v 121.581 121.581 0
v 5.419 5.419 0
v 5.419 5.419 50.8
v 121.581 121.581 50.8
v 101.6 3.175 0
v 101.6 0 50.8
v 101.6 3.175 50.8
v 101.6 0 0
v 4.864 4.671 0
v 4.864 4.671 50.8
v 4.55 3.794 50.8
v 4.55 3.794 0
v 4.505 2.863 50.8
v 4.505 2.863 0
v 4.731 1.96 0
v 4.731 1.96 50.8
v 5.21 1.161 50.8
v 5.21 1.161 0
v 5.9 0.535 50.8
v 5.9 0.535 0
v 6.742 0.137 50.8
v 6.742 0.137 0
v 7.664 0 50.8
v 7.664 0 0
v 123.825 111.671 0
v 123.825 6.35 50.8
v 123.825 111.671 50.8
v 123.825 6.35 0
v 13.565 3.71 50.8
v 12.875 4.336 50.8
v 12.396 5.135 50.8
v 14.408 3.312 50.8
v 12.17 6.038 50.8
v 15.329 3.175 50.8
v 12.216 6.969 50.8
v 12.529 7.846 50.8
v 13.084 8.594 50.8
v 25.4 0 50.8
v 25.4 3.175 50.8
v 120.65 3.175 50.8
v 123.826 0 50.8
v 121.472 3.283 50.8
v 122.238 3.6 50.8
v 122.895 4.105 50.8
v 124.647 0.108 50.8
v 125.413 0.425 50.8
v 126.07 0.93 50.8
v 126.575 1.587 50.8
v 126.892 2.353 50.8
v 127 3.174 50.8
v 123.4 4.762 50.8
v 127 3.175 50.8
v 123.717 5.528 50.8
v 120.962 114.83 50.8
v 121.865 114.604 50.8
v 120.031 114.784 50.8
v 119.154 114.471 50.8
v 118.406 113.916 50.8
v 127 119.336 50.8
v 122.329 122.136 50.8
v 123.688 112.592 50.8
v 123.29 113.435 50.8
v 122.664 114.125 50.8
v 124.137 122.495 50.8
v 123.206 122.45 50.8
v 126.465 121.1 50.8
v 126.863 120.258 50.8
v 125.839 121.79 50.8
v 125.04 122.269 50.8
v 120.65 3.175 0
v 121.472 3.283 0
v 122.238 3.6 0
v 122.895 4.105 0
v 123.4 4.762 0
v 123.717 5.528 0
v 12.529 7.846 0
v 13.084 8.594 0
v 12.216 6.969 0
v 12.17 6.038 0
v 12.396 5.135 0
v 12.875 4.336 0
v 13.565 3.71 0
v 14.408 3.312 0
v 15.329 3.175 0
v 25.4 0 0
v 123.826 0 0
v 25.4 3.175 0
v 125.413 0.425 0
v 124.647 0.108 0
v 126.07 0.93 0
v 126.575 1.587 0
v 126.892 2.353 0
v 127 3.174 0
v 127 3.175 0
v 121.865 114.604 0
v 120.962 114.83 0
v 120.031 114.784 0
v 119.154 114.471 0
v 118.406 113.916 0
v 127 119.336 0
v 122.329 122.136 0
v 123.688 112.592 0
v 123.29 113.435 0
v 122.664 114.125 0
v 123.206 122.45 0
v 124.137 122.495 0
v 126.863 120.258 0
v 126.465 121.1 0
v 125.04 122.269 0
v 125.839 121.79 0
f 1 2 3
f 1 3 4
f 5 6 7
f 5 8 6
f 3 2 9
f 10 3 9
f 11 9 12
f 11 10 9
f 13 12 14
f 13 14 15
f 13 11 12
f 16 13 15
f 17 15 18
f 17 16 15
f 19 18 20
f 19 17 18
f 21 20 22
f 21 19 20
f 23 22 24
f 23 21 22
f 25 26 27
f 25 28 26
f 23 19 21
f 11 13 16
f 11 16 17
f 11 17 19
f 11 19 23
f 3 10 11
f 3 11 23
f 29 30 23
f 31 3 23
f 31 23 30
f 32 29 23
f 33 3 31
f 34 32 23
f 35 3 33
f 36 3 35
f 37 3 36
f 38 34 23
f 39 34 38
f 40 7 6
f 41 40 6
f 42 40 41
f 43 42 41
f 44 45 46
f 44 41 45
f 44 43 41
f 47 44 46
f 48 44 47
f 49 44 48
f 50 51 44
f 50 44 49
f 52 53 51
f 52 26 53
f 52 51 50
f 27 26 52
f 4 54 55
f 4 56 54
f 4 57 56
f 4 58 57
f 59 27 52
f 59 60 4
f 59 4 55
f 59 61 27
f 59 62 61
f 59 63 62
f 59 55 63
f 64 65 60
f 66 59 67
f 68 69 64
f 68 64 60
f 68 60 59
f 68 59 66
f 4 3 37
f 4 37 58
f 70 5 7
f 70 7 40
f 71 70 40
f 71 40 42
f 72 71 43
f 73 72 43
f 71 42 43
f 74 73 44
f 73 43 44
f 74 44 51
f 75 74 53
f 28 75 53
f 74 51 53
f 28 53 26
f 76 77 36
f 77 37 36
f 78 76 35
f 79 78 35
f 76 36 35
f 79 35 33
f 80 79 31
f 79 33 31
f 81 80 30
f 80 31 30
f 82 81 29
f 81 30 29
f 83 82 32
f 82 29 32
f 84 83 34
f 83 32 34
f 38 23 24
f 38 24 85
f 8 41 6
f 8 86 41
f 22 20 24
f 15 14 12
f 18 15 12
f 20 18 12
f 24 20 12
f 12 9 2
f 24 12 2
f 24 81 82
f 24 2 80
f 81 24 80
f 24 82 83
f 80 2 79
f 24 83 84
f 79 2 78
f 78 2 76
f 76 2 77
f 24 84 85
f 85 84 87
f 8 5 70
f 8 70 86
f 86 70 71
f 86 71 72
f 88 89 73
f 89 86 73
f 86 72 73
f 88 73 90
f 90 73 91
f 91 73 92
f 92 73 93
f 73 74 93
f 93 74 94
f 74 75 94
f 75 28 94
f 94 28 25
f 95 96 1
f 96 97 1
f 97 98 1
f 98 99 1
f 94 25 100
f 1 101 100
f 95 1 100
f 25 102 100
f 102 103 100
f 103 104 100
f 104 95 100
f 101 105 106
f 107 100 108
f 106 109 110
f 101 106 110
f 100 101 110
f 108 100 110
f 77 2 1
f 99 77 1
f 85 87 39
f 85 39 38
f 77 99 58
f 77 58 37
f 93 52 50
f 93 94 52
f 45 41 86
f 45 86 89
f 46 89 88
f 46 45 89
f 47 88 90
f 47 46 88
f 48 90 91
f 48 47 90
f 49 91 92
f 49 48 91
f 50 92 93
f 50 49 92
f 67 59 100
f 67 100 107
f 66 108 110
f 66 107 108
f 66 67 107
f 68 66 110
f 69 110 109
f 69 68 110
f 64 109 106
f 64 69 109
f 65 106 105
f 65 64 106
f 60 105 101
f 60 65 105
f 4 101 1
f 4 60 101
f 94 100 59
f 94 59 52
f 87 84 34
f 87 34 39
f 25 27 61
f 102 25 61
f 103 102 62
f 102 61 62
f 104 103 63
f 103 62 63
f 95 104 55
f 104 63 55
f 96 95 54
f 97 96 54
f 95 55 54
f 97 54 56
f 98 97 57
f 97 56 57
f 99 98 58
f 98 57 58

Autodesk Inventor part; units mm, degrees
ref_plane "YZ Plane" through (0, 0, 0) normal (1, 0, 0) x (0, 1, 0)
ref_plane "XZ Plane" through (0, 0, 0) normal (0, 1, 0) x (-1, 0, 0)
ref_plane "XY Plane" through (0, 0, 0) normal (0, 0, 1) x (1, 0, 0)
sketch "Sketch1" plane through (0, 0, 0) normal (0, 0, 1) x (1, 0, 0)
  line L0 (0, 0) -> (25.4, 0)
  line L1 (0, 0) -> (127, 127)
  line L2 (127, 127) -> (127, 0)
  line L3 (123.825, 3.175) -> (123.825, 119.3349)
  line L4 (123.825, 119.3349) -> (7.6651, 3.175)
  line L5 (7.6651, 3.175) -> (25.4, 3.175)
  line L6 (25.4, 3.175) -> (25.4, 0)
  line L7 (127, 0) -> (101.6, 0)
  line L8 (101.6, 0) -> (101.6, 3.175)
  line L9 (127, 3.175) -> (127, 0)
  line L10 (101.6, 3.175) -> (123.825, 3.175)
  dimension "d0" = 127
  dimension "d1" = 127
  dimension "d2" = 25.4
  dimension "d4" = 3.175
  dimension "d5" = 3.175
  dimension "d6" = 3.175
  dimension "d7" = 25.4
  dimension "d8" = 3.175
extrude "Extrusion1" add sketch "Sketch1" along normal blind 50.8
fillet "Fillet1" radius 3.175 6 edges at (7.6651, 3.175, 25.4) (123.825, 119.3349, 25.4) (123.825, 3.175, 25.4) (127, 0, 25.4) (127, 127, 25.4) (0, 0, 25.4)
equation "\"d5\" = d4"
equation "\"d6\" = d5"
equation "\"d8\" = d5"
properties part number "apendage polycarb wedge"
